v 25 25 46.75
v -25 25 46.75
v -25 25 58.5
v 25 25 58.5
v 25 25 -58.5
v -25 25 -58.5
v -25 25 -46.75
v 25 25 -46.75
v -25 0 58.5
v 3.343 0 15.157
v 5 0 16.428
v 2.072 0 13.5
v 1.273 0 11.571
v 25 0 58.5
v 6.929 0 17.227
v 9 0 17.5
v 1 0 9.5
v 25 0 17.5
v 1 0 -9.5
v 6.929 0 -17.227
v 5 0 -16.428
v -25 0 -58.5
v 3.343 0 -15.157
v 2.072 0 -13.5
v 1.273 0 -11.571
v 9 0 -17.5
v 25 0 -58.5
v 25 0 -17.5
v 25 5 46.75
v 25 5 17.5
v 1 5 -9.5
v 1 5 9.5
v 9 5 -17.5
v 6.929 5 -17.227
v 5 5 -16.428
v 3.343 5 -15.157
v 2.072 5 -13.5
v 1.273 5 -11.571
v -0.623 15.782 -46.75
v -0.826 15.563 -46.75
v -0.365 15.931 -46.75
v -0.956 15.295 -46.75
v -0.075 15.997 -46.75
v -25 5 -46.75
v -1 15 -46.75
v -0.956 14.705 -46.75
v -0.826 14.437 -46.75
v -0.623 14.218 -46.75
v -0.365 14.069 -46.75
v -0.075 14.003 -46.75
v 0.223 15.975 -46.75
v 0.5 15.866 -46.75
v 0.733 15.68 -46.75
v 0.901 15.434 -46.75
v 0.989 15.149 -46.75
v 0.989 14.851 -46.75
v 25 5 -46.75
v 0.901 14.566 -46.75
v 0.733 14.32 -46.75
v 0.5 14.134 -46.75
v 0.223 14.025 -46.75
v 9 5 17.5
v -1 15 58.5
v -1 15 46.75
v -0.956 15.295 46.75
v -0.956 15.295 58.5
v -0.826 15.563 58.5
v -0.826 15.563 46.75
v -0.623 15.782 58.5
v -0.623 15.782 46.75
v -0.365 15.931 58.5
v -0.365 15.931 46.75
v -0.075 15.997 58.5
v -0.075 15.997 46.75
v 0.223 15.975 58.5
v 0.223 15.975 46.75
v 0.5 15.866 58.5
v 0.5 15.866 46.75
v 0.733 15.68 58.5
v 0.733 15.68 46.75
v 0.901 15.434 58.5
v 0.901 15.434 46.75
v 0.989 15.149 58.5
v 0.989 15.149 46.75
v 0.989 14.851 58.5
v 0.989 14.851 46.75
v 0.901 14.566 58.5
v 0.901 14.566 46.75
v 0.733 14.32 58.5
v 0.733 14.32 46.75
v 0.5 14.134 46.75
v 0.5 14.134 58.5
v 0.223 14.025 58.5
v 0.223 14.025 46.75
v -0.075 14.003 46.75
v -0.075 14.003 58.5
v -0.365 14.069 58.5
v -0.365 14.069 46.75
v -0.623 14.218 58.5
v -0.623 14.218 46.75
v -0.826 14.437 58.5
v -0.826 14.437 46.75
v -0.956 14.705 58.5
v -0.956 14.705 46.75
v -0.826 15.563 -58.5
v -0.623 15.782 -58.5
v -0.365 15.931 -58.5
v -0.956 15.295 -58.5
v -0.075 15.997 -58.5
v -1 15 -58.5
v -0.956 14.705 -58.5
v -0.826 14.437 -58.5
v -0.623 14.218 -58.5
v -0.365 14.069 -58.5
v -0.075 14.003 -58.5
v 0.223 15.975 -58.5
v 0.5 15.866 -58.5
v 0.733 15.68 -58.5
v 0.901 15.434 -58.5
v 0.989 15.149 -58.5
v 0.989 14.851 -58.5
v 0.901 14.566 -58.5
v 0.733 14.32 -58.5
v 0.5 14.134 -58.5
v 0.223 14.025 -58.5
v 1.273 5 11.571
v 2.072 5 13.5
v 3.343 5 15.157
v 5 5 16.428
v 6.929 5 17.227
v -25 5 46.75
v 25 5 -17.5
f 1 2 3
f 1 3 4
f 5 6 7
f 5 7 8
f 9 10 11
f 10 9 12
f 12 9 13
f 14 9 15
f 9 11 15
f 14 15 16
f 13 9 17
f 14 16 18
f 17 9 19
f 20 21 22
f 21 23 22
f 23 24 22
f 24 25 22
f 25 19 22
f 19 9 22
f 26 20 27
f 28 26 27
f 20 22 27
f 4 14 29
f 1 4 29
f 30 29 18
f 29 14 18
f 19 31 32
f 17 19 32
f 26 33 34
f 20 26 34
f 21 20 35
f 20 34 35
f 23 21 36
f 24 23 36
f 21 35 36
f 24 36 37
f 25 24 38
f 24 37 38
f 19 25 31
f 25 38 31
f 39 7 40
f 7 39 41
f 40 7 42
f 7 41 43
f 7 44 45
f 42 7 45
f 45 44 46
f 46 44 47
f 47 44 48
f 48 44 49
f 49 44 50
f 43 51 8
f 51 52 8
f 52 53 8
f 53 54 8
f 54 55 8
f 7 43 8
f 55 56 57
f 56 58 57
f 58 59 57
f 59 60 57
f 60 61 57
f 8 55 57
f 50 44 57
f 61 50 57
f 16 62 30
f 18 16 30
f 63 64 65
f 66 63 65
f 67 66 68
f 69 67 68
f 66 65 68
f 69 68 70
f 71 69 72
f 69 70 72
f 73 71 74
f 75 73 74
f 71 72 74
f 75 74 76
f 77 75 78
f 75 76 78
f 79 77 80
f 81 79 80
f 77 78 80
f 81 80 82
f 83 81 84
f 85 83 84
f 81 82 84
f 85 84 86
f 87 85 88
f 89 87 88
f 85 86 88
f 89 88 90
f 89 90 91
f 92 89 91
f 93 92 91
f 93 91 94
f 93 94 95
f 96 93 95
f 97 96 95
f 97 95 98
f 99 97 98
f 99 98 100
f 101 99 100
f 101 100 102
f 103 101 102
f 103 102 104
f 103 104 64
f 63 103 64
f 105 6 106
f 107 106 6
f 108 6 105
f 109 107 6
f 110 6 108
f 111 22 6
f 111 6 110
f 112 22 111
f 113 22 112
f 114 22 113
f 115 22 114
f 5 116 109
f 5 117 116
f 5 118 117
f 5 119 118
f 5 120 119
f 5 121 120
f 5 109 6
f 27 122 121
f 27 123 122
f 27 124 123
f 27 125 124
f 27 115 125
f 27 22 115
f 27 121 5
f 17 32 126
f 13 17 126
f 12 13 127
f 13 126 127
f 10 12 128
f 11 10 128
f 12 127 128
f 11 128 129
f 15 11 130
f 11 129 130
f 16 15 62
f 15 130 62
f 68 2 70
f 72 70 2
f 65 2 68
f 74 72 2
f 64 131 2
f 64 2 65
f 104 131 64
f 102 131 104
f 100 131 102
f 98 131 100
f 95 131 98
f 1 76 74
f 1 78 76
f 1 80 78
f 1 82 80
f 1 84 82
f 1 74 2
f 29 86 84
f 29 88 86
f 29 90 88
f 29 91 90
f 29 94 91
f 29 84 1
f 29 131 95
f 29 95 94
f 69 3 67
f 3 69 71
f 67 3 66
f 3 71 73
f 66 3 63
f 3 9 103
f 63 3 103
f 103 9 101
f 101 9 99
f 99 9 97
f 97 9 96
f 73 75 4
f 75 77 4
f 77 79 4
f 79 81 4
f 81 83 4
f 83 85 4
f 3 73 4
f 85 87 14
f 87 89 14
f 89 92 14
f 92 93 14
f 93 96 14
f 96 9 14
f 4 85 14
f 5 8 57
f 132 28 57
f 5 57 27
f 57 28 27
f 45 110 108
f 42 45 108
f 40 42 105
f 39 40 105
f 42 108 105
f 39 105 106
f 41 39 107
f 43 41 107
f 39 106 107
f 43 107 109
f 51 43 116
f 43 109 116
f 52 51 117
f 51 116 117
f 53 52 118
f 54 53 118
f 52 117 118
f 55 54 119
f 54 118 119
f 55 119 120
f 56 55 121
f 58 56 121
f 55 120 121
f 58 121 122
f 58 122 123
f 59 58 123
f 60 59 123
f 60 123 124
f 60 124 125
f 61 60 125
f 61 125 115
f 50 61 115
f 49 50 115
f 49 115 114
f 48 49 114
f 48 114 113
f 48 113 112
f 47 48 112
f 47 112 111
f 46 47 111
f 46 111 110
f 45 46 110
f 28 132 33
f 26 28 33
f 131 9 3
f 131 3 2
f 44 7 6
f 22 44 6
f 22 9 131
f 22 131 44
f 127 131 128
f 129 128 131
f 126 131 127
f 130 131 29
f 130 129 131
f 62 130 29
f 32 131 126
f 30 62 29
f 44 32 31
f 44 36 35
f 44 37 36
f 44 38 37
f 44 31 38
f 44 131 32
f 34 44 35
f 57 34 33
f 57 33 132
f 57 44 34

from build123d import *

# Parameters (mm, degrees)
CROQUIS1_W              = 50
CROQUIS1_H              = 117
SALIENTE_EXTRUIR1_DEPTH = 5
CROQUIS2_W              = 50
CROQUIS2_H              = 11.75
SALIENTE_EXTRUIR2_DEPTH = 20
CORTAR_EXTRUIR1_DEPTH   = 10
CROQUIS5_R              = 1
CORTAR_EXTRUIR3_DEPTH   = 118


with BuildPart() as part:
    # Croquis1 → Saliente-Extruir1 (new body)
    with BuildSketch(Plane(origin=(0, 0, 0), x_dir=(1, 0, 0), z_dir=(0, 1, 0))):
        Rectangle(CROQUIS1_W, CROQUIS1_H)
    extrude(amount=SALIENTE_EXTRUIR1_DEPTH)

    # Croquis2 → Saliente-Extruir2 (add)
    with BuildSketch(Plane(origin=(0, 5, 0), x_dir=(1, 0, 0), z_dir=(0, 1, 0))):
        with Locations((0, 52.625)):
            Rectangle(CROQUIS2_W, CROQUIS2_H)
        with Locations((0, -52.625)):
            Rectangle(CROQUIS2_W, CROQUIS2_H)
    extrude(amount=SALIENTE_EXTRUIR2_DEPTH)

    # Croquis3 → Cortar-Extruir1 (cut)
    with BuildSketch(Plane(origin=(0, 5, 0), x_dir=(1, 0, 0), z_dir=(0, 1, 0))):
        with BuildLine():
            Line((25, 17.5), (9, 17.5))
            ThreePointArc((9, 17.5), (3.343145751, 15.156854249), (1, 9.5))
            Line((1, 9.5), (1, -9.5))
            ThreePointArc((1, -9.5), (3.343145751, -15.156854249), (9, -17.5))
            Line((9, -17.5), (25, -17.5))
            Line((25, -17.5), (25, 17.5))
        make_face()
    extrude(amount=-CORTAR_EXTRUIR1_DEPTH, mode=Mode.SUBTRACT)

    # Croquis5 → Cortar-Extruir3 (cut, through all)
    with BuildSketch(Plane(origin=(0, 0, -58.5), x_dir=(-1, 0, 0), z_dir=(0, 0, -1))):
        with Locations((0, 15)):
            Circle(CROQUIS5_R)
    extrude(amount=-CORTAR_EXTRUIR3_DEPTH, mode=Mode.SUBTRACT)


solid = part.part
